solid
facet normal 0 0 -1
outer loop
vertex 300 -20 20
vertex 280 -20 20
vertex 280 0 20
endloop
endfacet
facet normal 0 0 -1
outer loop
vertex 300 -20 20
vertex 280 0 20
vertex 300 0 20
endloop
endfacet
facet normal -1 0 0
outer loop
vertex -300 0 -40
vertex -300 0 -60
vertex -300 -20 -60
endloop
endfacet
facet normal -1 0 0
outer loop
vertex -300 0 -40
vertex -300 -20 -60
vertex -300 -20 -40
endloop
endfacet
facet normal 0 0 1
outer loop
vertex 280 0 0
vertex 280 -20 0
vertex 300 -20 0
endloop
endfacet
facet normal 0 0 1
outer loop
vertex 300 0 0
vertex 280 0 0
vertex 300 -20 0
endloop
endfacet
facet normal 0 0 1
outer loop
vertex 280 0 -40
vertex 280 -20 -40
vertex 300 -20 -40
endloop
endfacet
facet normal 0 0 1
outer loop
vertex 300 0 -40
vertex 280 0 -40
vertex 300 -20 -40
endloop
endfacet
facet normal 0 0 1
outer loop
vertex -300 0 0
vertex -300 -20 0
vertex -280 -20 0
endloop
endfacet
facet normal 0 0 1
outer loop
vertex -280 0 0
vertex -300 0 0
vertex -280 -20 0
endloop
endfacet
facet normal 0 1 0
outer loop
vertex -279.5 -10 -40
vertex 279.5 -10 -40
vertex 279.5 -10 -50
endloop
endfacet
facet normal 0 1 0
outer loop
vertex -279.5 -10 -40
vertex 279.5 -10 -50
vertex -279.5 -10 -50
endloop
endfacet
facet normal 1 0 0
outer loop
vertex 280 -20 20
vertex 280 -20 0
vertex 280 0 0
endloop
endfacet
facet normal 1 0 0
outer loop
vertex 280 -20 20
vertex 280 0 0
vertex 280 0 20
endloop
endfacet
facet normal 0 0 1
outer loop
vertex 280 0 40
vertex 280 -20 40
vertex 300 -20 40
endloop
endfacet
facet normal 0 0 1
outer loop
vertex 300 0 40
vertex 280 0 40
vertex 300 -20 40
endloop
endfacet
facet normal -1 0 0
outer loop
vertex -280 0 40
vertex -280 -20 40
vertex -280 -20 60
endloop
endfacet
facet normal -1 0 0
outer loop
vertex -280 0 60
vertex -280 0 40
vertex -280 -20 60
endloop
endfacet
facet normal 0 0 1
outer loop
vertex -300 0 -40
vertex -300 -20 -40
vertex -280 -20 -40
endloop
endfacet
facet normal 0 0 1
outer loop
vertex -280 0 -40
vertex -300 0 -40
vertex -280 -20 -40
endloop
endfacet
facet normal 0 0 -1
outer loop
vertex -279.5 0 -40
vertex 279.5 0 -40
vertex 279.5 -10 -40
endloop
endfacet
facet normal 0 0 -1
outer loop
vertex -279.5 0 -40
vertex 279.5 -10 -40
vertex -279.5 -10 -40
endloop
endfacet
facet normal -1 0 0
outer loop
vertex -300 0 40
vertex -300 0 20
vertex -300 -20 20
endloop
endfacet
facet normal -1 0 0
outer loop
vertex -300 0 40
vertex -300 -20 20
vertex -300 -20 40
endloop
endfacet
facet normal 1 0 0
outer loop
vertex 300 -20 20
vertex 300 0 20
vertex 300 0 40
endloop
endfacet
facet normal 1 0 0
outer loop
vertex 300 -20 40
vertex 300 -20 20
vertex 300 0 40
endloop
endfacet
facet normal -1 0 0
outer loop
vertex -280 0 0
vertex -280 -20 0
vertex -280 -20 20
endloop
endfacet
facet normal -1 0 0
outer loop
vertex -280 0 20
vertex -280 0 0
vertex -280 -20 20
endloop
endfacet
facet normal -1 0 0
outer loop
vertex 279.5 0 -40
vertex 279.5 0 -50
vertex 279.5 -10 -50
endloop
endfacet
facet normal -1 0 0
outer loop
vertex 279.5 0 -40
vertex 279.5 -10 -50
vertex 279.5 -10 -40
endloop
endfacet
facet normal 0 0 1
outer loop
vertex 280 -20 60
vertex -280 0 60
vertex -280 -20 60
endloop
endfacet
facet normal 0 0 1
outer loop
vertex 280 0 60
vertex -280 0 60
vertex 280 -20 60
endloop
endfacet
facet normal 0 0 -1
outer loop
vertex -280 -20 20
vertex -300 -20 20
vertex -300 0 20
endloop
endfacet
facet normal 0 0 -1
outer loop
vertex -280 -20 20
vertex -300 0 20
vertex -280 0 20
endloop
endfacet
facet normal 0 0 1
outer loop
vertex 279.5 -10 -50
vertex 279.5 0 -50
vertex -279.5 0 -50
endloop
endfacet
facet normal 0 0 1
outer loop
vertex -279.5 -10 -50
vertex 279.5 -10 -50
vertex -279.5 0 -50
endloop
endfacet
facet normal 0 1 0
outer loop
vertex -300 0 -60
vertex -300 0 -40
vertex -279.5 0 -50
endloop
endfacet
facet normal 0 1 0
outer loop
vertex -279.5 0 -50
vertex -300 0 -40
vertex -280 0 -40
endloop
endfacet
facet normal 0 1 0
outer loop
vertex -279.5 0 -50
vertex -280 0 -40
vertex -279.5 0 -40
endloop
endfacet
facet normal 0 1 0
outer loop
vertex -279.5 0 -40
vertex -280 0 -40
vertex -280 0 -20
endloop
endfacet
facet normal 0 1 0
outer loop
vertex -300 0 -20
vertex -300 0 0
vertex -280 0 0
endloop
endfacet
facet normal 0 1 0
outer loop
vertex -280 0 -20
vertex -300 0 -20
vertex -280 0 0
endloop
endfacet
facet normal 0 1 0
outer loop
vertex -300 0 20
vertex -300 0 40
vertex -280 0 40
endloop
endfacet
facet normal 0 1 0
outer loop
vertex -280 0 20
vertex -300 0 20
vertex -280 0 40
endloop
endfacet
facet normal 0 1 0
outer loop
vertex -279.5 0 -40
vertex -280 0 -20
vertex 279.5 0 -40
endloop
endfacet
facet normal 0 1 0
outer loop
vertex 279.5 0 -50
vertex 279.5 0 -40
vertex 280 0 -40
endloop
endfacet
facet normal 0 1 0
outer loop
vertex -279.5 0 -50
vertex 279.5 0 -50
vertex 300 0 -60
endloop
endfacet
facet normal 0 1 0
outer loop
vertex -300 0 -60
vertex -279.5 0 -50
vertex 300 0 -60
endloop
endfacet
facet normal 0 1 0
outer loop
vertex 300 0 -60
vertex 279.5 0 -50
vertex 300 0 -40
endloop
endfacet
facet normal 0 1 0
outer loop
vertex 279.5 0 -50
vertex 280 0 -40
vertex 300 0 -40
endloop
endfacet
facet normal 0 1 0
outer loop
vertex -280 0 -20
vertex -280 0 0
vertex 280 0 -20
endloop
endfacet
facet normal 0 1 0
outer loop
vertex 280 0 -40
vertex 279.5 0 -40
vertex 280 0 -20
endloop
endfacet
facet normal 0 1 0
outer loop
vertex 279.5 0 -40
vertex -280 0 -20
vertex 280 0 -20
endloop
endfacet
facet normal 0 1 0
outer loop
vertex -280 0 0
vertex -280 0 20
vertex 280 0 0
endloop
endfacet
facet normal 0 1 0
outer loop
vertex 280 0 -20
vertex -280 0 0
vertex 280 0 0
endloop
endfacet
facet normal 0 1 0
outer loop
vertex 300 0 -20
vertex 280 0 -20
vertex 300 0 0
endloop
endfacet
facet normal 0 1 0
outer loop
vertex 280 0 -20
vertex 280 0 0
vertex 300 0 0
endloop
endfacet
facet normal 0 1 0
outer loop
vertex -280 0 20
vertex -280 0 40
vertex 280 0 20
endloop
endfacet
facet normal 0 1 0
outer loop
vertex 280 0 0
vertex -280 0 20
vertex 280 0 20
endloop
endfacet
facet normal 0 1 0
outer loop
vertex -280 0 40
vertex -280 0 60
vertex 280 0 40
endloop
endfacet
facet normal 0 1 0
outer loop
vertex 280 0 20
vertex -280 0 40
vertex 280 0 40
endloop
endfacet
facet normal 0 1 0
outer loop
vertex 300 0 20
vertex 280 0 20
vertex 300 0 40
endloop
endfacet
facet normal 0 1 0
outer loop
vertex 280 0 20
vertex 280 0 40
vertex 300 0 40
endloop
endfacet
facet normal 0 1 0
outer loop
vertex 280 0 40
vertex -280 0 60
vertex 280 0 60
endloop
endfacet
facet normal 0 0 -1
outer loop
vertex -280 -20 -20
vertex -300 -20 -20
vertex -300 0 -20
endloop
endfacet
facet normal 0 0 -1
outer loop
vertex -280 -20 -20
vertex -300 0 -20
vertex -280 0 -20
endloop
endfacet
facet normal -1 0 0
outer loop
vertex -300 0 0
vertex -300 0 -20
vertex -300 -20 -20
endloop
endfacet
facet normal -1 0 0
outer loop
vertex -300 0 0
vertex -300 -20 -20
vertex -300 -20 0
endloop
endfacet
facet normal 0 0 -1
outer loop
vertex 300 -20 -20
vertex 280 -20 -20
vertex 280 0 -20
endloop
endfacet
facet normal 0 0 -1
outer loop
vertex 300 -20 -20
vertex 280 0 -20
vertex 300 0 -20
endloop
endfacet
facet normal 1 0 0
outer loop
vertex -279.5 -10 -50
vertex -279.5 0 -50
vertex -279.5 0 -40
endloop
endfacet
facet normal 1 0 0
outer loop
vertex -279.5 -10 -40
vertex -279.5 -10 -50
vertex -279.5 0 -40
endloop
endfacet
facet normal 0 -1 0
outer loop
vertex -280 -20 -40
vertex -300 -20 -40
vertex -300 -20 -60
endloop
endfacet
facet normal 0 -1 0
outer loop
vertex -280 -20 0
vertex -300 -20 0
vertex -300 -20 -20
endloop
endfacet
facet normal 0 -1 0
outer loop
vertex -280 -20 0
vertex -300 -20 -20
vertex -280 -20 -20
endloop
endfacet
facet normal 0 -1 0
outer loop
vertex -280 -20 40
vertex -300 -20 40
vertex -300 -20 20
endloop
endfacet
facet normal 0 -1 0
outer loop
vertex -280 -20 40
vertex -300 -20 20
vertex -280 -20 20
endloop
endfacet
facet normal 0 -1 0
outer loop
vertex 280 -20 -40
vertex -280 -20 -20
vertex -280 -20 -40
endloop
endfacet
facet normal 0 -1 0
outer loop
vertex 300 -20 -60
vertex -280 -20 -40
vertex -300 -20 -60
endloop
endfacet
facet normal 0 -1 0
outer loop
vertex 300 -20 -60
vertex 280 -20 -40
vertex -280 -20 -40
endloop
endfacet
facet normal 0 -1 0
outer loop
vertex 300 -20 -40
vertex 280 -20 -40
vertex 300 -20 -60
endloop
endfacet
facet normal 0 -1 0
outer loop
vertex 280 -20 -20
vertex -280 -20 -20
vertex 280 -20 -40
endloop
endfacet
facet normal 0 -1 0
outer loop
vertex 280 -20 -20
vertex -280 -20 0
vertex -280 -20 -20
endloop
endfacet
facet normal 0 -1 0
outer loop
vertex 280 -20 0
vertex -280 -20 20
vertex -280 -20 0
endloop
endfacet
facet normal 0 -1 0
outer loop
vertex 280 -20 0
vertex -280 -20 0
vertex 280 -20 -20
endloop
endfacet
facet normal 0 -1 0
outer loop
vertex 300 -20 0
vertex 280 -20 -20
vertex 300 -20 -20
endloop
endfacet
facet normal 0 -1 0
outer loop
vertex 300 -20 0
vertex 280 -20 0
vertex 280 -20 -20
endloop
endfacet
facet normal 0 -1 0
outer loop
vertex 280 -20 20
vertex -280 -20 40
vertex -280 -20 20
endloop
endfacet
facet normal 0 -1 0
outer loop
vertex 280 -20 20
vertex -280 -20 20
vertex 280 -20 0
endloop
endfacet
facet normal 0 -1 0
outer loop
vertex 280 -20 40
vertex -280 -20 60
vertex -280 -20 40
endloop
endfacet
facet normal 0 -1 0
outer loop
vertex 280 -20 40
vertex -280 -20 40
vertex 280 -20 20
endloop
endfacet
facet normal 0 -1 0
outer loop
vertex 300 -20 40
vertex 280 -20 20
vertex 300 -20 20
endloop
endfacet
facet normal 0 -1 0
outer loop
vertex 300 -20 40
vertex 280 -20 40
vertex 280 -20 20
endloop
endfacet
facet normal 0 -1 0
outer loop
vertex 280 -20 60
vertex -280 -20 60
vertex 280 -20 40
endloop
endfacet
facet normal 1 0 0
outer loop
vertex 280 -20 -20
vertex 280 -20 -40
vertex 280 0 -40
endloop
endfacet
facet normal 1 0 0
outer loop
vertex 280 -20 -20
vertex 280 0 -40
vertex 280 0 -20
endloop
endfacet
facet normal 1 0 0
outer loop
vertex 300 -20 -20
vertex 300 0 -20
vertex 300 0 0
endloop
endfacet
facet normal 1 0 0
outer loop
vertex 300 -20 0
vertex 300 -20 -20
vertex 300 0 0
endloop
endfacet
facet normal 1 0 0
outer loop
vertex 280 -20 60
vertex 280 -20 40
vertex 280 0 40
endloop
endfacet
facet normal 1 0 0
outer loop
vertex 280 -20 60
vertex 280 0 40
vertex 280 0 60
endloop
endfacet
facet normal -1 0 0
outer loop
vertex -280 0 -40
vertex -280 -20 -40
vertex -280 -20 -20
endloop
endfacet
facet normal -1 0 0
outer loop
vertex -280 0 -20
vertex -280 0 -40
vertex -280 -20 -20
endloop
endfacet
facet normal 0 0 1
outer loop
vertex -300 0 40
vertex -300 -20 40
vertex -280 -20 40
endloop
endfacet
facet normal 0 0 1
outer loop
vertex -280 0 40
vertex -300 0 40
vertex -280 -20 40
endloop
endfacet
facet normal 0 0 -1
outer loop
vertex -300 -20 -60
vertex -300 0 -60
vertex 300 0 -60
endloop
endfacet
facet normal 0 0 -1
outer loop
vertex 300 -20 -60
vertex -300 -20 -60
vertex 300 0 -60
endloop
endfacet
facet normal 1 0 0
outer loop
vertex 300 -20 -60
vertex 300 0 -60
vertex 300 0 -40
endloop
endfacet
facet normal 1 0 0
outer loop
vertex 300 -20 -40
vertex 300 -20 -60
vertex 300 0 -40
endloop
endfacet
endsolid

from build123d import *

# Parameters (mm, degrees)
F0_W     = 600
F0_H     = 120
F1_DEPTH = 20
F2_W     = 20
F2_H     = 20
F3_DEPTH = 20
F4_W     = 559
F4_H     = 10
F5_DEPTH = 10


with BuildPart() as f1:
    # F0 (on Front) → F1 (new body)
    with BuildSketch(Plane.XZ):
        Rectangle(F0_W, F0_H)
    extrude(amount=F1_DEPTH)

    # F2 (on face) → F3 (cut, through all)
    with BuildSketch(Plane.XZ.offset(20)):
        with Locations((290, -30)):
            Rectangle(F2_W, F2_H)
        with Locations((290, 10)):
            Rectangle(F2_W, F2_H)
        with Locations((-290, 10)):
            Rectangle(F2_W, F2_H)
        with Locations((-290, -30)):
            Rectangle(F2_W, F2_H)
        with Locations((290, 50)):
            Rectangle(F2_W, F2_H)
        with Locations((-290, 50)):
            Rectangle(F2_W, F2_H)
    extrude(amount=-F3_DEPTH, mode=Mode.SUBTRACT)

    # F4 (on face) → F5 (cut)
    with BuildSketch(Plane(origin=(0, 0, 0), x_dir=(-1, 0, 0), z_dir=(0, 1, 0))):
        with Locations((0, -45)):
            Rectangle(F4_W, F4_H)
    extrude(amount=-F5_DEPTH, mode=Mode.SUBTRACT)


solid = f1.part
